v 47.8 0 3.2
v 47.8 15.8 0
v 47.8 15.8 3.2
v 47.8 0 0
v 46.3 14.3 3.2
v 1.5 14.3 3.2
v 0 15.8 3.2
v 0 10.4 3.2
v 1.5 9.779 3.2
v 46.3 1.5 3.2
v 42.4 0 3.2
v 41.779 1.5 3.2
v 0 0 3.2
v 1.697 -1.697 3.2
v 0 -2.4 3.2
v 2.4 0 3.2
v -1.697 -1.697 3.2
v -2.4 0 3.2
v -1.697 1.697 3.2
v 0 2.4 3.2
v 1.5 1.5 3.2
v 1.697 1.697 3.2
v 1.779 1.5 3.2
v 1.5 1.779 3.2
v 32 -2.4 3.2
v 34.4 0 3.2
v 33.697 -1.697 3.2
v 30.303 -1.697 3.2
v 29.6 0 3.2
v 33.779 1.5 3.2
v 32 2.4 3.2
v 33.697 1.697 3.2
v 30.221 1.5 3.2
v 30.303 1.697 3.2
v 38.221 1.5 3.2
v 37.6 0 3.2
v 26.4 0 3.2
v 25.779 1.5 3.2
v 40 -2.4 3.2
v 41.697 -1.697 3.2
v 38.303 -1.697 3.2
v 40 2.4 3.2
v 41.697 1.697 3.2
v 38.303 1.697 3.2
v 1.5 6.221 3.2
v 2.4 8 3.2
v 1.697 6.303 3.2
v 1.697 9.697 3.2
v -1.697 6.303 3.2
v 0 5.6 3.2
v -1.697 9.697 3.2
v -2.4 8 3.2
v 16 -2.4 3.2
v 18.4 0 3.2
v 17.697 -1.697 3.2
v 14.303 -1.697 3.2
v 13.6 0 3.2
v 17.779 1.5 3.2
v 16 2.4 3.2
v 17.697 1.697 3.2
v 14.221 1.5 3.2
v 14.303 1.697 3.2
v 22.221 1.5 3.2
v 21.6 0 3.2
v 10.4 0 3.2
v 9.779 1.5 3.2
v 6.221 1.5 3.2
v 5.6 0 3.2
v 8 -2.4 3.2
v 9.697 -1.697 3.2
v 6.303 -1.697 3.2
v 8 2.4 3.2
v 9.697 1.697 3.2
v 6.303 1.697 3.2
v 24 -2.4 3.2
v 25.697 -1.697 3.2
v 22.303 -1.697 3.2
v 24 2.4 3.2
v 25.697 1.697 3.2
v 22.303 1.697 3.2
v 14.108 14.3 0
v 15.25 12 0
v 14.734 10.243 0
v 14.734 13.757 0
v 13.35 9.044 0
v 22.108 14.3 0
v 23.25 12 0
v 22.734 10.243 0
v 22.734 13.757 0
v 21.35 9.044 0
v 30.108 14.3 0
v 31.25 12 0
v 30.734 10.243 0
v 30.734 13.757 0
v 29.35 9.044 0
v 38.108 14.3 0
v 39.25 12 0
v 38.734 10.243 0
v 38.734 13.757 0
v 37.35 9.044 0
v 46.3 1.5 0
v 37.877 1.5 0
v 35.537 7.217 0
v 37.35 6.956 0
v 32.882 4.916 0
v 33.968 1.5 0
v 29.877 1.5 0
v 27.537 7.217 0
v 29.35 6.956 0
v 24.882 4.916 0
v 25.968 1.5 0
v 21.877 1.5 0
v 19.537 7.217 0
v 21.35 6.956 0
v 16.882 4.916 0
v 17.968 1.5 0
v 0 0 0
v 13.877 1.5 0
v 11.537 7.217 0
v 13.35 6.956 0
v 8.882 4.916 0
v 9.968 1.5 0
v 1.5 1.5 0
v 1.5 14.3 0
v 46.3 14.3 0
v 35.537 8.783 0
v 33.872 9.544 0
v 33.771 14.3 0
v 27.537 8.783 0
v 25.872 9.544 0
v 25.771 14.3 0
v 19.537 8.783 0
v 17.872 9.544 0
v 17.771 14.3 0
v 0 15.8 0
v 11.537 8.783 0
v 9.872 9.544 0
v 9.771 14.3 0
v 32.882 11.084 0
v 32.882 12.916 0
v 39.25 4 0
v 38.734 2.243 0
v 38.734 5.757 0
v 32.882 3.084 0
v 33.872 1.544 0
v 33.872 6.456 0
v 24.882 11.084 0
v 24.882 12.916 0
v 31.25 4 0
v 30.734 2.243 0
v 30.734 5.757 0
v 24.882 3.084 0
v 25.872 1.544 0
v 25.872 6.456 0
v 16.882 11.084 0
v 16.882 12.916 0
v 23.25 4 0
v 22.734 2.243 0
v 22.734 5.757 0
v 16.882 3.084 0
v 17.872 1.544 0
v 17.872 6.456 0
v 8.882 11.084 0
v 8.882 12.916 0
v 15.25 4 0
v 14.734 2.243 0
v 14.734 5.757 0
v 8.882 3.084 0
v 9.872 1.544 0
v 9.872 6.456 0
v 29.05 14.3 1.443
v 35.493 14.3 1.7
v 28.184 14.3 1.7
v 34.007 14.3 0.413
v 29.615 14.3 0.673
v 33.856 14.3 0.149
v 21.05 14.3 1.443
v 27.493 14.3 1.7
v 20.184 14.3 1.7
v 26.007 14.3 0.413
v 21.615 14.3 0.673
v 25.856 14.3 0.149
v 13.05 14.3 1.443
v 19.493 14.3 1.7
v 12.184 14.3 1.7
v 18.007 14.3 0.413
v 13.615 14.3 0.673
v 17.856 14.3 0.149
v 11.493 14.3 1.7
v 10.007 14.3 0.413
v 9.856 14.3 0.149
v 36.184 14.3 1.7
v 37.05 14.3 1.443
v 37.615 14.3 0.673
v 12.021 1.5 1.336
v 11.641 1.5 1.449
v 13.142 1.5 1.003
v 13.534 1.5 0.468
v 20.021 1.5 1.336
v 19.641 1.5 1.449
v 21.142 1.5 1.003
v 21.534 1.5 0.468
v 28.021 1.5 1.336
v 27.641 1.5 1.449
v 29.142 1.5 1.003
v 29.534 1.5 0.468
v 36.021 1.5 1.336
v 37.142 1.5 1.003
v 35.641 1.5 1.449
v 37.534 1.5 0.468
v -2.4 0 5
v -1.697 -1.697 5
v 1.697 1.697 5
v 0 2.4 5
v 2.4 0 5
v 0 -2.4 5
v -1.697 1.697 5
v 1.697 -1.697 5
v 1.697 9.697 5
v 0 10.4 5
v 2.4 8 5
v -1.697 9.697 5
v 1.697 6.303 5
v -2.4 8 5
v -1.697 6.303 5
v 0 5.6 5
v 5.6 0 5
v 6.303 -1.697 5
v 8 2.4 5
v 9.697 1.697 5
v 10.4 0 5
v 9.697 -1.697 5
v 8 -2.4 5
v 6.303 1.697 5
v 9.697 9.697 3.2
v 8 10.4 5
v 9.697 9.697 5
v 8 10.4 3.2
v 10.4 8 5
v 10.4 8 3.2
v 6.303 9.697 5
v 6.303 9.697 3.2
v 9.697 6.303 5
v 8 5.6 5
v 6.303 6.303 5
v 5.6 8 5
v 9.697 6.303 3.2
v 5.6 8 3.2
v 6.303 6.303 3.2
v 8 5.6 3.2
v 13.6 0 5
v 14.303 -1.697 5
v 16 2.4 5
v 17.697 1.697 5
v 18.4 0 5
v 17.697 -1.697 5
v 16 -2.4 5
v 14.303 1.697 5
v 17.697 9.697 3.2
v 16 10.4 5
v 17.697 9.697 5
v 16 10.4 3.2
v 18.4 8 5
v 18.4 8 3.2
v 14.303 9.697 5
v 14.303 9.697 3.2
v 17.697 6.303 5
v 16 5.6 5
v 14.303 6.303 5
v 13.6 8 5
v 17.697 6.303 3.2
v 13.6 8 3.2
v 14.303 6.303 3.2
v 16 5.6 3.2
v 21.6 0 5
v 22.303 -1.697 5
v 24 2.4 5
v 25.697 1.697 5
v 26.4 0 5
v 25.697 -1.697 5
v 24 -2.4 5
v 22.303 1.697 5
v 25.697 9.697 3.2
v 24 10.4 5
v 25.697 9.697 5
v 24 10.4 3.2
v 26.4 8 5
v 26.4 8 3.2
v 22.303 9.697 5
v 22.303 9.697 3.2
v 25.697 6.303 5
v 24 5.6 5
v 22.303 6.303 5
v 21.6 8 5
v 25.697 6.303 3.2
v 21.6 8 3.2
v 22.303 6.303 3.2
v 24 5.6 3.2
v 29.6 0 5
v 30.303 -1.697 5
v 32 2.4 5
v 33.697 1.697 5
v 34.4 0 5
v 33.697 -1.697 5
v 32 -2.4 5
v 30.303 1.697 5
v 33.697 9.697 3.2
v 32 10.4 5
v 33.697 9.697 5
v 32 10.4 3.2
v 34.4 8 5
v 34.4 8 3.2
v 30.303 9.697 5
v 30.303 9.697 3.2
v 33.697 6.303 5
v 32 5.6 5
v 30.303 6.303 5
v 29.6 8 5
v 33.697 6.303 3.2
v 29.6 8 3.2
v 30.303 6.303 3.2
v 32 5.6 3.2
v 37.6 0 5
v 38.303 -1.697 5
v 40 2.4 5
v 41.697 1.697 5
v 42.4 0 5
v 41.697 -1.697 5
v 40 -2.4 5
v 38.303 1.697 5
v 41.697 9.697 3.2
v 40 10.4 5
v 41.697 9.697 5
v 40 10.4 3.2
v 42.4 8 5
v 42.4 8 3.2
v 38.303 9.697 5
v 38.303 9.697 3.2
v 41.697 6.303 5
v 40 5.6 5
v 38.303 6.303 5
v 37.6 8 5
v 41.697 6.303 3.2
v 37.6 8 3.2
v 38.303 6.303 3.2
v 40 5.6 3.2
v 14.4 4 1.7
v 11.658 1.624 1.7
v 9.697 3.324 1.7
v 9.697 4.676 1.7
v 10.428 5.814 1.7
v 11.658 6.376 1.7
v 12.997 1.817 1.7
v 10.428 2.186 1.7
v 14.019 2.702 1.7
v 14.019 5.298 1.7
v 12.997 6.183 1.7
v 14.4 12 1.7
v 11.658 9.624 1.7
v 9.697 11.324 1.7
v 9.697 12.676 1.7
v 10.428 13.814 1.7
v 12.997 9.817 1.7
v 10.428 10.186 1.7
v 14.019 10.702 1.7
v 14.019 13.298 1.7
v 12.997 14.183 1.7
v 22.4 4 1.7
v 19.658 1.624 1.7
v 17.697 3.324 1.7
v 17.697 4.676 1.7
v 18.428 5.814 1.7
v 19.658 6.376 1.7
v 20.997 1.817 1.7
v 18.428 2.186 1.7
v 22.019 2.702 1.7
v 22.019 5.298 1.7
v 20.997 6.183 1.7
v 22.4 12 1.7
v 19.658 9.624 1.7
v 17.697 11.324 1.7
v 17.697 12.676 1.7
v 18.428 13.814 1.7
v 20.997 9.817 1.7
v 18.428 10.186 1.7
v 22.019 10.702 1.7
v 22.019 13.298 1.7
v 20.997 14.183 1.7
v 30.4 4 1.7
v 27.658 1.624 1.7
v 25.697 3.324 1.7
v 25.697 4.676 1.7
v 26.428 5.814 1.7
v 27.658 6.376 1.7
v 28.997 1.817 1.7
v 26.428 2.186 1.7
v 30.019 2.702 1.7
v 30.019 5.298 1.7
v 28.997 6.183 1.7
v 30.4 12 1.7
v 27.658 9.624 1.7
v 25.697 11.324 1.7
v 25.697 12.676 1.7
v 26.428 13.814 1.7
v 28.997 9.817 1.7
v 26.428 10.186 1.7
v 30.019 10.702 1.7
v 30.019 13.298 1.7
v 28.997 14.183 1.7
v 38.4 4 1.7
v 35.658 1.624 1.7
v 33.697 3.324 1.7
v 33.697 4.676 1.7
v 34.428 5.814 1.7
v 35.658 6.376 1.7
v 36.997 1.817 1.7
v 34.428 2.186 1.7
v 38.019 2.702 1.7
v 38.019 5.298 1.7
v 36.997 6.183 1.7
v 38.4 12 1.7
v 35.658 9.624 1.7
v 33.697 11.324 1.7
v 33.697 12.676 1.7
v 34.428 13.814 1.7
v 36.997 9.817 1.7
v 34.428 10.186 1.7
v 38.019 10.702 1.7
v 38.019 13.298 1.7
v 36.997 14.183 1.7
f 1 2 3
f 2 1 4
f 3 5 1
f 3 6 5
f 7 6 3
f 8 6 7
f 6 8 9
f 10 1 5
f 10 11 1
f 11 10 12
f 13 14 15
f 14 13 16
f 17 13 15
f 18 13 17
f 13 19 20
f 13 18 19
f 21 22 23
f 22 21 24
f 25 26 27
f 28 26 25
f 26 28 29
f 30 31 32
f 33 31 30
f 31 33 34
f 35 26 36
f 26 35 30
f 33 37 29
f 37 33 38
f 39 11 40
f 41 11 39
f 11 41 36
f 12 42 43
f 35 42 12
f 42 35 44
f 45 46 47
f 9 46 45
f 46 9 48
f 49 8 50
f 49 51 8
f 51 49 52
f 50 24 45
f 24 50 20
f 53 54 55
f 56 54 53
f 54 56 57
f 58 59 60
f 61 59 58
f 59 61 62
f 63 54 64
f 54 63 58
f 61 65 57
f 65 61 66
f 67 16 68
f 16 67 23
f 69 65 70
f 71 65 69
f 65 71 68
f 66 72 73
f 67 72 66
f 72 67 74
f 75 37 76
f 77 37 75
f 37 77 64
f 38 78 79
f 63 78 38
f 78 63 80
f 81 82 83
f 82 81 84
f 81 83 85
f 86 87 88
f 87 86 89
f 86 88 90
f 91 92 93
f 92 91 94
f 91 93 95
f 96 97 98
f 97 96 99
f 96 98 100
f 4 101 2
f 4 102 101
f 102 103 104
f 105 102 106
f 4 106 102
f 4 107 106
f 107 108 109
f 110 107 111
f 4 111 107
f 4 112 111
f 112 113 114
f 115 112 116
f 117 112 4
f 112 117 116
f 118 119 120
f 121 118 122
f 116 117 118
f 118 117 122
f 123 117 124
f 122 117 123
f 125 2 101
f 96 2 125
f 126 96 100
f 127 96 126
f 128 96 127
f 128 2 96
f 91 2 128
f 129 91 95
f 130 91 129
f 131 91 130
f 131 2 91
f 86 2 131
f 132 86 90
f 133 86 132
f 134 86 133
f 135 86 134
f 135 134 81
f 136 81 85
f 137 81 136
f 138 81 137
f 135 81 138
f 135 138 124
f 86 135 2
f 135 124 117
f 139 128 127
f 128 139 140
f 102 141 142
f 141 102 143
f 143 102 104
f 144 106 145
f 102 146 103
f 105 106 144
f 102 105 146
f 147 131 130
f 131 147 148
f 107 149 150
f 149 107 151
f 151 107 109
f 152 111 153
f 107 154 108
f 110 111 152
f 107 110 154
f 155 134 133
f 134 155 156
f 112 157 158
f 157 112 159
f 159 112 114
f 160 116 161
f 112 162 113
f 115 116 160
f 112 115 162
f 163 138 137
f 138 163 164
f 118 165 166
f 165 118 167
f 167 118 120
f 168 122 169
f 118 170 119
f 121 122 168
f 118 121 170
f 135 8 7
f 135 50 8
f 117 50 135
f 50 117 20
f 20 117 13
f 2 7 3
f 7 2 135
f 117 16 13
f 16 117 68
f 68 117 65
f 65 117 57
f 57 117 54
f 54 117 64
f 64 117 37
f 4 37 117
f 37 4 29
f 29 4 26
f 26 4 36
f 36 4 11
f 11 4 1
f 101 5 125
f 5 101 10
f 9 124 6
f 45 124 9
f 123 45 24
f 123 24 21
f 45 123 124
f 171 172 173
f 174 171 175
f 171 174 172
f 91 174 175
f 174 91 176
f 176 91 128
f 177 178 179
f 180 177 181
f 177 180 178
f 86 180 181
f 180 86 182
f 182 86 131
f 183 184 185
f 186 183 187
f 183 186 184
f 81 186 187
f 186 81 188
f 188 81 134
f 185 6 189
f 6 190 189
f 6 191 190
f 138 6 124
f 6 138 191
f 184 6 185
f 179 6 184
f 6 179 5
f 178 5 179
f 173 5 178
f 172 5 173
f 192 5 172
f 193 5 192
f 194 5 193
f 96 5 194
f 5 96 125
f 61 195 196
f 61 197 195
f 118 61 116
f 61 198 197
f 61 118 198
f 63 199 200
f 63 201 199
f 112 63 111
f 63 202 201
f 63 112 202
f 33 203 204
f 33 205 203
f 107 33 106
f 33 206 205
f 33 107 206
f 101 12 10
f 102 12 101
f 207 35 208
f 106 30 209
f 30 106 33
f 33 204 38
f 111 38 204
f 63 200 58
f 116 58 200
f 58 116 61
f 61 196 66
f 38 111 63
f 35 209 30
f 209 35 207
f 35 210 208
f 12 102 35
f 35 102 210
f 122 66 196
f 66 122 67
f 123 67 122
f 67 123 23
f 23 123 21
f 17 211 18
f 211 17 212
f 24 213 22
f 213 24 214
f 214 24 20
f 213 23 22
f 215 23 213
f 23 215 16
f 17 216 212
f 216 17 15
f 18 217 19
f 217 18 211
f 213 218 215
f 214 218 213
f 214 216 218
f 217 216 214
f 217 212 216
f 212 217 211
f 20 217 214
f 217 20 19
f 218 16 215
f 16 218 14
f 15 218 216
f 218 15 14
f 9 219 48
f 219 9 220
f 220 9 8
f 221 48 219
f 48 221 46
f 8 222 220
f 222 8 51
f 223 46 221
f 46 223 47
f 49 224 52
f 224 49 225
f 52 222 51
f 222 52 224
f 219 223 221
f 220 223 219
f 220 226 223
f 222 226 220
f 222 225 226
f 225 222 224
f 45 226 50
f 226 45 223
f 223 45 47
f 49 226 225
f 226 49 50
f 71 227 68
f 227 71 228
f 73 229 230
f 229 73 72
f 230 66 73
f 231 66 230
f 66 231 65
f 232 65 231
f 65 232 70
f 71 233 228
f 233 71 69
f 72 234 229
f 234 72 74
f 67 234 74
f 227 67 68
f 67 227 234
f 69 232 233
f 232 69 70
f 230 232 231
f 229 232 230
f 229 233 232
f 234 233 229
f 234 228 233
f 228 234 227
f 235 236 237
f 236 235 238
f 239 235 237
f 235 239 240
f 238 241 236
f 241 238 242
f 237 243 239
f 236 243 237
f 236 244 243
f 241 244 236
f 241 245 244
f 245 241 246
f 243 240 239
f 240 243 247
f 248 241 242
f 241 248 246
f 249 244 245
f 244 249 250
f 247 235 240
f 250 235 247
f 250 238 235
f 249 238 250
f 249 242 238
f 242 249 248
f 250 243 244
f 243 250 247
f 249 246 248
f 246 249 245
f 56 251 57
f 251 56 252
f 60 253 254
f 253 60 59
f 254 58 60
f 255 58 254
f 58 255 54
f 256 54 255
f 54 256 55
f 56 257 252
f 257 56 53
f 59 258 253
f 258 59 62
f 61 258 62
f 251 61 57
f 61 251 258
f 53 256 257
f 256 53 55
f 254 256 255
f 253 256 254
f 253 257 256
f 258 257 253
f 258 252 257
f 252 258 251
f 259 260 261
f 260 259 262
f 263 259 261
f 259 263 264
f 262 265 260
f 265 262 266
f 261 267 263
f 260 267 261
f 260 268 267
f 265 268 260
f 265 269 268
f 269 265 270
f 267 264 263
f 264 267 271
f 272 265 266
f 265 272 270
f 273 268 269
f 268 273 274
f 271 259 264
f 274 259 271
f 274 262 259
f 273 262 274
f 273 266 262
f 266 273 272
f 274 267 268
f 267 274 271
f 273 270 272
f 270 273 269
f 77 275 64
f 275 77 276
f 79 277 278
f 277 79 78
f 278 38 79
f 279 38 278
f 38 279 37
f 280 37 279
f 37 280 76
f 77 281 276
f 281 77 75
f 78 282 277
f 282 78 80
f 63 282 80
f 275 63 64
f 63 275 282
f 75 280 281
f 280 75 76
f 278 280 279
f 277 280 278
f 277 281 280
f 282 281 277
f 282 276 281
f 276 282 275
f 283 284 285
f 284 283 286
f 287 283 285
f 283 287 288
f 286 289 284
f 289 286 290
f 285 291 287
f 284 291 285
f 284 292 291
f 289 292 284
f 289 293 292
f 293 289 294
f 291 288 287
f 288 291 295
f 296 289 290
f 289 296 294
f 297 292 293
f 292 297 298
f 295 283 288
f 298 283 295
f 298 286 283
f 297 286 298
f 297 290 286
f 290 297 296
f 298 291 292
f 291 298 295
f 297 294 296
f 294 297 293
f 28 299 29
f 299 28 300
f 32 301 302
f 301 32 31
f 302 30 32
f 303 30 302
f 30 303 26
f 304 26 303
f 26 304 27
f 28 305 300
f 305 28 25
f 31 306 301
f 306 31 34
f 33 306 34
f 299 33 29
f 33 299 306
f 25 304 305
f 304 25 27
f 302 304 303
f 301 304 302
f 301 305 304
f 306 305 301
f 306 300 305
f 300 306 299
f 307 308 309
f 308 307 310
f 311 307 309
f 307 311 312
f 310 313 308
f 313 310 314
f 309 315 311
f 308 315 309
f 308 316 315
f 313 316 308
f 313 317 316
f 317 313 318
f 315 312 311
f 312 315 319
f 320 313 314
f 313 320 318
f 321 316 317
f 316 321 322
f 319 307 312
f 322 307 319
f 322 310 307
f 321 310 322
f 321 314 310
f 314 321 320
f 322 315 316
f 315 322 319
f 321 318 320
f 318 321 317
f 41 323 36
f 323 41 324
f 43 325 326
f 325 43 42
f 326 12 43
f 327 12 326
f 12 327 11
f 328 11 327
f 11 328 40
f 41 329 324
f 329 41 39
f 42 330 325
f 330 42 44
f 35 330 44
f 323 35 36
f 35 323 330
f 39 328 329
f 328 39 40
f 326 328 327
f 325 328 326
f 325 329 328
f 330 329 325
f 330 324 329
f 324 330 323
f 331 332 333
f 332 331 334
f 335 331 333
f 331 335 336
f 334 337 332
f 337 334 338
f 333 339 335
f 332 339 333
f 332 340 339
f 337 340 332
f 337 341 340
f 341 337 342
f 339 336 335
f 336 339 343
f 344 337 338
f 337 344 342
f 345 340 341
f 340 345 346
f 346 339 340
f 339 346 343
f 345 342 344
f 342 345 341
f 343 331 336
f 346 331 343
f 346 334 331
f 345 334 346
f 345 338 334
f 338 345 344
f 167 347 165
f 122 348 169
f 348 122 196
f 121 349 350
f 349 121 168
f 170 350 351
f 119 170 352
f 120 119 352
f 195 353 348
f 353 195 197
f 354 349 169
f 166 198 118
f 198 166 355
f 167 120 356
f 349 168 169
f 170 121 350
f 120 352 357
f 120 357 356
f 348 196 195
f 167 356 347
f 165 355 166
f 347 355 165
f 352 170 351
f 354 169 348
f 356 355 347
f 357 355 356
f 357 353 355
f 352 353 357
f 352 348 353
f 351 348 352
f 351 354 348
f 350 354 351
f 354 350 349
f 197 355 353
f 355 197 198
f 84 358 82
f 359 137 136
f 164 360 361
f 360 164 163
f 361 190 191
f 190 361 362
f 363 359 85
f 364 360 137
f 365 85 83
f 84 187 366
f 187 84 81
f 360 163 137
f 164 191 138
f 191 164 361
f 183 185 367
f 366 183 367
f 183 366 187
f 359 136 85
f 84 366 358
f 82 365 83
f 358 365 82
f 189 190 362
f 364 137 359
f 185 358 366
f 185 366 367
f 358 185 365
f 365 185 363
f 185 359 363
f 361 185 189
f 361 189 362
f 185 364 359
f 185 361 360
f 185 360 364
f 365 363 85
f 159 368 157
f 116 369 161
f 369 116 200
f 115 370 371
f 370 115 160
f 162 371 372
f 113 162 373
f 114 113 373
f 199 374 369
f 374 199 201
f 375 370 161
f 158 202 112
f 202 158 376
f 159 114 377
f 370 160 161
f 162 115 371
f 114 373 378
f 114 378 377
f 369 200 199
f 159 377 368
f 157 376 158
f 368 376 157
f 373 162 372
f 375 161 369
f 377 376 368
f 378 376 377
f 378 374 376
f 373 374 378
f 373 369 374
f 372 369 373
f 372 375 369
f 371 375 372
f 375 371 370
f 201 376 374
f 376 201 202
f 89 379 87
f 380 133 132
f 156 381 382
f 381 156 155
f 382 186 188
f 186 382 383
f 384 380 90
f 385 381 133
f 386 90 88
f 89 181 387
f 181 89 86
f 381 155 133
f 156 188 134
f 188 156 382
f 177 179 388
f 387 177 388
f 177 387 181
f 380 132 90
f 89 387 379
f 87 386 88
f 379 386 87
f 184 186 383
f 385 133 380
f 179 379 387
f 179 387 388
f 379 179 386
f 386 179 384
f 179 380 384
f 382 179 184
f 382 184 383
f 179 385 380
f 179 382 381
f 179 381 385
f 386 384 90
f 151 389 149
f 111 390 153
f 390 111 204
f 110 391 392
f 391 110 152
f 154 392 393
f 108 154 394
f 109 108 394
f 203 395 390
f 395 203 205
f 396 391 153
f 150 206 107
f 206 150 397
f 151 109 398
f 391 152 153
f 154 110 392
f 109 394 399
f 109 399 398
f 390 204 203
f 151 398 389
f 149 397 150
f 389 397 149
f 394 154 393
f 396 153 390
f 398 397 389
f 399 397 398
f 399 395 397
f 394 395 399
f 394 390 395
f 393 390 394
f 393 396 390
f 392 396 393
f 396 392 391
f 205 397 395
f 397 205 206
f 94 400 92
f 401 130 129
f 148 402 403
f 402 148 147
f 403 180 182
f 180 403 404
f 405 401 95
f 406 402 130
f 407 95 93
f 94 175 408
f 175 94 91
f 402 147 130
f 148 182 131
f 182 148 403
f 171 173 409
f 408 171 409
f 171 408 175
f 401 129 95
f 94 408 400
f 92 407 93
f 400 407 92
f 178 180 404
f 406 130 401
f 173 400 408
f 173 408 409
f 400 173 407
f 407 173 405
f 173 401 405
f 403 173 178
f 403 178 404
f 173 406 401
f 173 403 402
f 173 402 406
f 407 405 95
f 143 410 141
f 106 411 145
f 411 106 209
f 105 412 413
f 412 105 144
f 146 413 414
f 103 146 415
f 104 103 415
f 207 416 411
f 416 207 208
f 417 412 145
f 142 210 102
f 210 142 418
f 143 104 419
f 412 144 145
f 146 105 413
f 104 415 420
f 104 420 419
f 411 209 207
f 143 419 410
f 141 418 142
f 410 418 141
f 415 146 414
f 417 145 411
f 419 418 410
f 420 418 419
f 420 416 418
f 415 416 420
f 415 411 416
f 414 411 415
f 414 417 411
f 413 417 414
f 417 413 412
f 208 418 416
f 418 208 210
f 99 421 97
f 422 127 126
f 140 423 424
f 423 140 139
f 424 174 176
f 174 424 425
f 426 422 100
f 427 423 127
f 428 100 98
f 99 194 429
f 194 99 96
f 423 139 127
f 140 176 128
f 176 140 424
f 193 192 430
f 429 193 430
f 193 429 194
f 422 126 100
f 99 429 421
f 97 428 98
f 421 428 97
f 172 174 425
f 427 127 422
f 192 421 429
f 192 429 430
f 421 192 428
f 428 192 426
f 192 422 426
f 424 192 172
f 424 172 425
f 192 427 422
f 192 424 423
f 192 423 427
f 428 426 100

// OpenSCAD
module lego_brick(lbumps = 6, wbumps = 2, thin = true) {
    pitch = 8.0;
    clearance = 0.1;
    bumpDiam = 4.8;
    bumpHeight = 1.8;
    height = thin ? 3.2 : 9.6;
    t = (pitch - 2 * clearance - bumpDiam) / 2.0;
    postDiam = pitch - t;
    total_length = lbumps * pitch - 2.0 * clearance;
    total_width = wbumps * pitch - 2.0 * clearance;
    
    // Base block
    difference(){
        cube([total_length, total_width, height]);
        
        // Hollow out the base
        translate([t, t, 0])
        cube([total_length - 2 * t, total_width - 2 * t, height]);
    }
    
    // Add bumps
    for(x=[0:lbumps-1], y=[0:wbumps-1]){
        translate([x*pitch, y*pitch, height])
        cylinder(r=bumpDiam/2, h=bumpHeight);
    }
    
    // Add posts
    if(lbumps > 1 && wbumps > 1){
        for(x=[1:lbumps-2], y=[1:wbumps-2]){
            translate([(x + 0.5) * pitch, (y + 0.5) * pitch, 0])
            cylinder(r1=postDiam/2, r2=bumpDiam/2, h=height - t);
        }
    } else if(lbumps > 1) {
        for(x=[1:lbumps-2]){
            translate([(x + 0.5) * pitch, pitch / 2, 0])
            cylinder(r=t, h=height - t);
        }
    } else if(wbumps > 1) {
        for(y=[1:wbumps-2]){
            translate([pitch / 2, (y + 0.5) * pitch, 0])
            cylinder(r=t, h=height - t);
        }
    }
}

// Render the Lego brick
lego_brick();
